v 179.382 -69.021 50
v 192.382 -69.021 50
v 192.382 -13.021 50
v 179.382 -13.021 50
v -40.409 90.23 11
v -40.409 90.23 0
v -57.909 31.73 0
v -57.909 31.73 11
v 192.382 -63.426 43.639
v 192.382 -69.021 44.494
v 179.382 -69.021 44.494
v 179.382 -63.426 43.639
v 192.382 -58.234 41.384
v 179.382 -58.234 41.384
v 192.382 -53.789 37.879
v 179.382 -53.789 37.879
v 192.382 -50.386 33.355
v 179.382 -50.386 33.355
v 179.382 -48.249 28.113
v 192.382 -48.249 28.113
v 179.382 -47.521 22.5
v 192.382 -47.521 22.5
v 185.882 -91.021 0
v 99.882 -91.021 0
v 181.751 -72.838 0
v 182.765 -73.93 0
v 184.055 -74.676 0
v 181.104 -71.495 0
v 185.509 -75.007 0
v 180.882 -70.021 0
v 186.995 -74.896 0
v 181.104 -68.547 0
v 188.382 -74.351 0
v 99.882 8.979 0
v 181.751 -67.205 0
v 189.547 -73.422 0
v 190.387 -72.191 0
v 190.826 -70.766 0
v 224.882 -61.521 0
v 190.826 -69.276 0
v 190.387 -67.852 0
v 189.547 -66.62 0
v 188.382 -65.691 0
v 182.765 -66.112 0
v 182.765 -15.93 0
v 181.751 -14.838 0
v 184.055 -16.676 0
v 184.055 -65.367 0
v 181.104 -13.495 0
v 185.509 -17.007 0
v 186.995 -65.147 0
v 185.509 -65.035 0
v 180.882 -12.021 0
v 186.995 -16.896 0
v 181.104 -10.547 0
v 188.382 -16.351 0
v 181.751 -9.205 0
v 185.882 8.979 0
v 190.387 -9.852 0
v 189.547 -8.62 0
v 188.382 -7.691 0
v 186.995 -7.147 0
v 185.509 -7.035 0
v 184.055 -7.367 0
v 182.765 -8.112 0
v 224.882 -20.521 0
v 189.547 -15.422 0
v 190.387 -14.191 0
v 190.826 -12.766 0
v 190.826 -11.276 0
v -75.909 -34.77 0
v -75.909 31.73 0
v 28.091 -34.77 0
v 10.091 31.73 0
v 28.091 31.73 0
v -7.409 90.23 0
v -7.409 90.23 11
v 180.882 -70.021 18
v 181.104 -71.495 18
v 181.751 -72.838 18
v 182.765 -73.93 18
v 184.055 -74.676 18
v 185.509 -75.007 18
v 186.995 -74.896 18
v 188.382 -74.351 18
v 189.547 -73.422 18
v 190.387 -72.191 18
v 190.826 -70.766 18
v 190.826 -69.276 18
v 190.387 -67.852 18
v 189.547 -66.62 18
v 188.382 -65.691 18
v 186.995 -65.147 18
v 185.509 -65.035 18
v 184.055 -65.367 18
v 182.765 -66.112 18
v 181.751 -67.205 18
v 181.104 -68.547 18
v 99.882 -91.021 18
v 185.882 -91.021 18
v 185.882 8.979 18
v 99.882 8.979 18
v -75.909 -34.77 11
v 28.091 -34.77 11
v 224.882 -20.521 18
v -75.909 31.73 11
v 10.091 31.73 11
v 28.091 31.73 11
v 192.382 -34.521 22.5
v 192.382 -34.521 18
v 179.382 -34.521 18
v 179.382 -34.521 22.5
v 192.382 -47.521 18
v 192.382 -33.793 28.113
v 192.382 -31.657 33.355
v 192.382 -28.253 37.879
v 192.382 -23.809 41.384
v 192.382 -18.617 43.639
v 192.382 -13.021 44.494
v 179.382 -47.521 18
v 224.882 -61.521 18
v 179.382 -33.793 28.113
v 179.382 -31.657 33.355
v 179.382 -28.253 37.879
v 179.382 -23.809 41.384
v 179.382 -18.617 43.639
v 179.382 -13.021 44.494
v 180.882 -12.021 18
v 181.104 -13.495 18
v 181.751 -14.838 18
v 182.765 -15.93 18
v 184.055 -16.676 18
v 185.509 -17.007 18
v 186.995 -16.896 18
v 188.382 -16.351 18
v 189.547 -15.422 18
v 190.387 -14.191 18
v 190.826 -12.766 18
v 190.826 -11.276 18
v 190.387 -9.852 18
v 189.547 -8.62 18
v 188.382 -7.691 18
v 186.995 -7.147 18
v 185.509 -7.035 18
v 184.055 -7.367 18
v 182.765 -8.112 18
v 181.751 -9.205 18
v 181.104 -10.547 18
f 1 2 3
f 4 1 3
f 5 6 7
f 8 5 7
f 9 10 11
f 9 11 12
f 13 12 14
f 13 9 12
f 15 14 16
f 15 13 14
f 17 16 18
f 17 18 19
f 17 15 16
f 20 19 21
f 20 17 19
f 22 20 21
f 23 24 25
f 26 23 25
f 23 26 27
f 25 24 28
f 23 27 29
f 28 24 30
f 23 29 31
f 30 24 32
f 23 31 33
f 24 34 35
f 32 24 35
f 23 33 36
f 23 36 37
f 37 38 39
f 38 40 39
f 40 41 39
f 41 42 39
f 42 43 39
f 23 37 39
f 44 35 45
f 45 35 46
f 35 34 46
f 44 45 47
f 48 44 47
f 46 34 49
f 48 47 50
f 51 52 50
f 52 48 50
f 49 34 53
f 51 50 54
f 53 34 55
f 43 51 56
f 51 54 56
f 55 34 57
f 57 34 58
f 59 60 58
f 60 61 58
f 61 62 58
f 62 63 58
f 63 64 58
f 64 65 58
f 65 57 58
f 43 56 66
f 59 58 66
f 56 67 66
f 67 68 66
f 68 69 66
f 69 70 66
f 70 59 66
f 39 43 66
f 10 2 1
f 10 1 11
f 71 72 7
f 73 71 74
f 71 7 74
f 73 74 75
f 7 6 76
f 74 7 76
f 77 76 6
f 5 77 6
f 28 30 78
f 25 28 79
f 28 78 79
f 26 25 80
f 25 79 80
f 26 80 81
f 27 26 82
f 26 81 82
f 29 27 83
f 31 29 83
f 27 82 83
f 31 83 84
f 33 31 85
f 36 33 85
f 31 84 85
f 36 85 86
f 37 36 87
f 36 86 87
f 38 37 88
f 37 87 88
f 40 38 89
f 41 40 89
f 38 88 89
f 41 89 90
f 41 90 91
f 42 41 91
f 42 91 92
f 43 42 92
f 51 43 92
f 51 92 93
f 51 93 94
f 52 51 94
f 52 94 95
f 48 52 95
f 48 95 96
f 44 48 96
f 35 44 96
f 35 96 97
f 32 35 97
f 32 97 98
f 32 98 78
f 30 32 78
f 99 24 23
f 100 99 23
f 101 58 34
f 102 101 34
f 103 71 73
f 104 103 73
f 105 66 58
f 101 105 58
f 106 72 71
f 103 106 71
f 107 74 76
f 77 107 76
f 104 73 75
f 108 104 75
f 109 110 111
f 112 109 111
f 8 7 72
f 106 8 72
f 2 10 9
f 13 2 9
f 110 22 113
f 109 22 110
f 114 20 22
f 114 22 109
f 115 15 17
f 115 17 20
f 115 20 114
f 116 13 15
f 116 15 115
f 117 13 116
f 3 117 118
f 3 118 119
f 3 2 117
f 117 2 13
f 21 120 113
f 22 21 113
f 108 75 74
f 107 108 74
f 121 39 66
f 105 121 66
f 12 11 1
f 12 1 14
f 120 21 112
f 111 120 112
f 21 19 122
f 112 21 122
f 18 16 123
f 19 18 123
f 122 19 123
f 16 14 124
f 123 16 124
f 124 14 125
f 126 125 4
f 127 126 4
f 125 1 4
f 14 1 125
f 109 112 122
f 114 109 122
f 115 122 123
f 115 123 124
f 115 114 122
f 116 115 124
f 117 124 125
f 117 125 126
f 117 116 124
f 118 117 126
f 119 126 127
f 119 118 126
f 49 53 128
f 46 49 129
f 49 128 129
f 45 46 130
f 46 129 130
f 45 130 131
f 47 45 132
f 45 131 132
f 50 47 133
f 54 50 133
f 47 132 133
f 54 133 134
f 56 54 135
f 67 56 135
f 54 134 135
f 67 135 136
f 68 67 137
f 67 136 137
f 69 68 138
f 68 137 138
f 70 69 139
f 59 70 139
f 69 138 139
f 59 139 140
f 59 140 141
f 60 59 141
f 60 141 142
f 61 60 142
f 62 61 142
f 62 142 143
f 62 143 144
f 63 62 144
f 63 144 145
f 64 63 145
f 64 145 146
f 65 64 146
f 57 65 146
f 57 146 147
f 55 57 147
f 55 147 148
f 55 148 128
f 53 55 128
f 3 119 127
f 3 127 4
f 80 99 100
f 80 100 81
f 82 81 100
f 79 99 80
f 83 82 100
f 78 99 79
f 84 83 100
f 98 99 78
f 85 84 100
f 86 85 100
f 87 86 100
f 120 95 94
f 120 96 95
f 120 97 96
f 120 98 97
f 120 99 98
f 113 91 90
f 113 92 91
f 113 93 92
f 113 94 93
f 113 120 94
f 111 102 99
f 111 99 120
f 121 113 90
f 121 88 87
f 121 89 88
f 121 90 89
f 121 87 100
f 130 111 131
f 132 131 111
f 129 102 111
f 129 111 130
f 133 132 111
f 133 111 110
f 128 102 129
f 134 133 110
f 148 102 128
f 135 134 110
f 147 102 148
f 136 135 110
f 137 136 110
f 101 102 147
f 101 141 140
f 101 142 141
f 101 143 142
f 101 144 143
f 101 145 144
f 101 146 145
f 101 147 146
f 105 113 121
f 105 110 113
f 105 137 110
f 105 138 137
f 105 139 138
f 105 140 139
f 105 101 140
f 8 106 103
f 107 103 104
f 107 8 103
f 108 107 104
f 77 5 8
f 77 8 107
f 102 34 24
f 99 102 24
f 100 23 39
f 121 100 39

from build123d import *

# Parameters (mm, degrees)
F1_DEPTH = 11
F3_DEPTH = 18
F2_W     = 6.5
F2_H     = 6.5
F4_DEPTH = 50
F5_W     = 21.5
F5_H     = 5.5
F6_DEPTH = 13
F7_D     = 10
F7_DEPTH = 20
F7_TIP   = 3.0043030951


with BuildPart() as f1:
    # F0 (on Top) → F1 (new body)
    with BuildSketch(Plane.XY):
        Polygon((-40.4092696905, 90.2303121984), (-57.9092696905, 31.7303121984), (-23.9092696905, 31.7303121984), (-23.9092696905, 90.2303121984), align=None)
        Polygon((-23.9092696905, 90.2303121984), (-23.9092696905, 31.7303121984), (10.0907303095, 31.7303121984), (-7.4092696905, 90.2303121984), align=None)
        Polygon((10.0907303095, 31.7303121984), (-23.9092696905, 31.7303121984), (-23.9092696905, -34.7696878016), (28.0907303095, -34.7696878016), (28.0907303095, 31.7303121984), align=None)
        Polygon((-57.9092696905, 31.7303121984), (-75.9092696905, 31.7303121984), (-75.9092696905, -34.7696878016), (-23.9092696905, -34.7696878016), (-23.9092696905, 31.7303121984), align=None)
    extrude(amount=F1_DEPTH)


with BuildPart() as f3:
    # F2 (on Top) → F3 (new body)
    with BuildSketch(Plane.XY):
        Polygon((185.882166028, 8.9787812233), (99.882166028, 8.9787812233), (99.882166028, -41.0212187767), (179.382166028, -41.0212187767), (179.382166028, -34.5212187767), (185.882166028, -34.5212187767), (185.882166028, -12.0212187767), align=None)
        Polygon((179.382166028, -41.0212187767), (99.882166028, -41.0212187767), (99.882166028, -91.0212187767), (185.882166028, -91.0212187767), (185.882166028, -70.0212187767), (185.882166028, -47.5212187767), (179.382166028, -47.5212187767), align=None)
        Polygon((224.882166028, -61.5212187767), (224.882166028, -41.0212187767), (192.382166028, -41.0212187767), (192.382166028, -47.5212187767), (185.882166028, -47.5212187767), (185.882166028, -70.0212187767), (185.882166028, -91.0212187767), align=None)
        Polygon((224.882166028, -20.5212187767), (185.882166028, 8.9787812233), (185.882166028, -12.0212187767), (185.882166028, -34.5212187767), (192.382166028, -34.5212187767), (192.382166028, -41.0212187767), (224.882166028, -41.0212187767), align=None)
    extrude(amount=F3_DEPTH)

    # F2 (on Top) → F4 (join)
    with BuildSketch(Plane.XY):
        with Locations((189.132166028, -37.7712187767)):
            Rectangle(F2_W, F2_H)
        with Locations((182.632166028, -37.7712187767)):
            Rectangle(F2_W, F2_H)
        with Locations((182.632166028, -44.2712187767)):
            Rectangle(F2_W, F2_H)
        with Locations((189.132166028, -44.2712187767)):
            Rectangle(F2_W, F2_H)
    extrude(amount=F4_DEPTH)

    # F5 (on face) → F6 (join)
    with BuildSketch(Plane.YZ.offset(192.382166028)):
        with Locations((-58.2712187767, 47.25)):
            Rectangle(F5_W, F5_H)
        with Locations((-23.7712187767, 47.25)):
            Rectangle(F5_W, F5_H)
        with BuildLine():
            Line((-47.5212187767, 22.5), (-47.5212187767, 44.5))
            Line((-47.5212187767, 44.5), (-69.0212187767, 44.5))
            Line((-69.0212187767, 44.5), (-69.0212187767, 44.4943174479))
            ThreePointArc((-69.0212187767, 44.4943174479), (-53.7890860542, 37.8785564992), (-47.5212187767, 22.5))
        make_face()
        with BuildLine():
            Line((-13.0212187767, 44.5), (-34.5212187767, 44.5))
            Line((-34.5212187767, 44.5), (-34.5212187767, 22.5))
            ThreePointArc((-34.5212187767, 22.5), (-28.2533514993, 37.8785564992), (-13.0212187767, 44.4943174479))
            Line((-13.0212187767, 44.4943174479), (-13.0212187767, 44.5))
        make_face()
    extrude(amount=-F6_DEPTH)

    # F7
    with Locations(Plane(origin=(0, 0, 0), x_dir=(1, 0, 0), z_dir=(0, 0, -1))):
        with Locations((185.882166028, 70.0212187767), (185.882166028, 12.0212187767)):
            Hole(F7_D / 2, depth=F7_DEPTH)
            with Locations((0, 0, -(F7_DEPTH + F7_TIP / 2))):  # 118° drill point
                Cone(0, F7_D / 2, F7_TIP, mode=Mode.SUBTRACT)


solid = Compound([f1.part, f3.part])
